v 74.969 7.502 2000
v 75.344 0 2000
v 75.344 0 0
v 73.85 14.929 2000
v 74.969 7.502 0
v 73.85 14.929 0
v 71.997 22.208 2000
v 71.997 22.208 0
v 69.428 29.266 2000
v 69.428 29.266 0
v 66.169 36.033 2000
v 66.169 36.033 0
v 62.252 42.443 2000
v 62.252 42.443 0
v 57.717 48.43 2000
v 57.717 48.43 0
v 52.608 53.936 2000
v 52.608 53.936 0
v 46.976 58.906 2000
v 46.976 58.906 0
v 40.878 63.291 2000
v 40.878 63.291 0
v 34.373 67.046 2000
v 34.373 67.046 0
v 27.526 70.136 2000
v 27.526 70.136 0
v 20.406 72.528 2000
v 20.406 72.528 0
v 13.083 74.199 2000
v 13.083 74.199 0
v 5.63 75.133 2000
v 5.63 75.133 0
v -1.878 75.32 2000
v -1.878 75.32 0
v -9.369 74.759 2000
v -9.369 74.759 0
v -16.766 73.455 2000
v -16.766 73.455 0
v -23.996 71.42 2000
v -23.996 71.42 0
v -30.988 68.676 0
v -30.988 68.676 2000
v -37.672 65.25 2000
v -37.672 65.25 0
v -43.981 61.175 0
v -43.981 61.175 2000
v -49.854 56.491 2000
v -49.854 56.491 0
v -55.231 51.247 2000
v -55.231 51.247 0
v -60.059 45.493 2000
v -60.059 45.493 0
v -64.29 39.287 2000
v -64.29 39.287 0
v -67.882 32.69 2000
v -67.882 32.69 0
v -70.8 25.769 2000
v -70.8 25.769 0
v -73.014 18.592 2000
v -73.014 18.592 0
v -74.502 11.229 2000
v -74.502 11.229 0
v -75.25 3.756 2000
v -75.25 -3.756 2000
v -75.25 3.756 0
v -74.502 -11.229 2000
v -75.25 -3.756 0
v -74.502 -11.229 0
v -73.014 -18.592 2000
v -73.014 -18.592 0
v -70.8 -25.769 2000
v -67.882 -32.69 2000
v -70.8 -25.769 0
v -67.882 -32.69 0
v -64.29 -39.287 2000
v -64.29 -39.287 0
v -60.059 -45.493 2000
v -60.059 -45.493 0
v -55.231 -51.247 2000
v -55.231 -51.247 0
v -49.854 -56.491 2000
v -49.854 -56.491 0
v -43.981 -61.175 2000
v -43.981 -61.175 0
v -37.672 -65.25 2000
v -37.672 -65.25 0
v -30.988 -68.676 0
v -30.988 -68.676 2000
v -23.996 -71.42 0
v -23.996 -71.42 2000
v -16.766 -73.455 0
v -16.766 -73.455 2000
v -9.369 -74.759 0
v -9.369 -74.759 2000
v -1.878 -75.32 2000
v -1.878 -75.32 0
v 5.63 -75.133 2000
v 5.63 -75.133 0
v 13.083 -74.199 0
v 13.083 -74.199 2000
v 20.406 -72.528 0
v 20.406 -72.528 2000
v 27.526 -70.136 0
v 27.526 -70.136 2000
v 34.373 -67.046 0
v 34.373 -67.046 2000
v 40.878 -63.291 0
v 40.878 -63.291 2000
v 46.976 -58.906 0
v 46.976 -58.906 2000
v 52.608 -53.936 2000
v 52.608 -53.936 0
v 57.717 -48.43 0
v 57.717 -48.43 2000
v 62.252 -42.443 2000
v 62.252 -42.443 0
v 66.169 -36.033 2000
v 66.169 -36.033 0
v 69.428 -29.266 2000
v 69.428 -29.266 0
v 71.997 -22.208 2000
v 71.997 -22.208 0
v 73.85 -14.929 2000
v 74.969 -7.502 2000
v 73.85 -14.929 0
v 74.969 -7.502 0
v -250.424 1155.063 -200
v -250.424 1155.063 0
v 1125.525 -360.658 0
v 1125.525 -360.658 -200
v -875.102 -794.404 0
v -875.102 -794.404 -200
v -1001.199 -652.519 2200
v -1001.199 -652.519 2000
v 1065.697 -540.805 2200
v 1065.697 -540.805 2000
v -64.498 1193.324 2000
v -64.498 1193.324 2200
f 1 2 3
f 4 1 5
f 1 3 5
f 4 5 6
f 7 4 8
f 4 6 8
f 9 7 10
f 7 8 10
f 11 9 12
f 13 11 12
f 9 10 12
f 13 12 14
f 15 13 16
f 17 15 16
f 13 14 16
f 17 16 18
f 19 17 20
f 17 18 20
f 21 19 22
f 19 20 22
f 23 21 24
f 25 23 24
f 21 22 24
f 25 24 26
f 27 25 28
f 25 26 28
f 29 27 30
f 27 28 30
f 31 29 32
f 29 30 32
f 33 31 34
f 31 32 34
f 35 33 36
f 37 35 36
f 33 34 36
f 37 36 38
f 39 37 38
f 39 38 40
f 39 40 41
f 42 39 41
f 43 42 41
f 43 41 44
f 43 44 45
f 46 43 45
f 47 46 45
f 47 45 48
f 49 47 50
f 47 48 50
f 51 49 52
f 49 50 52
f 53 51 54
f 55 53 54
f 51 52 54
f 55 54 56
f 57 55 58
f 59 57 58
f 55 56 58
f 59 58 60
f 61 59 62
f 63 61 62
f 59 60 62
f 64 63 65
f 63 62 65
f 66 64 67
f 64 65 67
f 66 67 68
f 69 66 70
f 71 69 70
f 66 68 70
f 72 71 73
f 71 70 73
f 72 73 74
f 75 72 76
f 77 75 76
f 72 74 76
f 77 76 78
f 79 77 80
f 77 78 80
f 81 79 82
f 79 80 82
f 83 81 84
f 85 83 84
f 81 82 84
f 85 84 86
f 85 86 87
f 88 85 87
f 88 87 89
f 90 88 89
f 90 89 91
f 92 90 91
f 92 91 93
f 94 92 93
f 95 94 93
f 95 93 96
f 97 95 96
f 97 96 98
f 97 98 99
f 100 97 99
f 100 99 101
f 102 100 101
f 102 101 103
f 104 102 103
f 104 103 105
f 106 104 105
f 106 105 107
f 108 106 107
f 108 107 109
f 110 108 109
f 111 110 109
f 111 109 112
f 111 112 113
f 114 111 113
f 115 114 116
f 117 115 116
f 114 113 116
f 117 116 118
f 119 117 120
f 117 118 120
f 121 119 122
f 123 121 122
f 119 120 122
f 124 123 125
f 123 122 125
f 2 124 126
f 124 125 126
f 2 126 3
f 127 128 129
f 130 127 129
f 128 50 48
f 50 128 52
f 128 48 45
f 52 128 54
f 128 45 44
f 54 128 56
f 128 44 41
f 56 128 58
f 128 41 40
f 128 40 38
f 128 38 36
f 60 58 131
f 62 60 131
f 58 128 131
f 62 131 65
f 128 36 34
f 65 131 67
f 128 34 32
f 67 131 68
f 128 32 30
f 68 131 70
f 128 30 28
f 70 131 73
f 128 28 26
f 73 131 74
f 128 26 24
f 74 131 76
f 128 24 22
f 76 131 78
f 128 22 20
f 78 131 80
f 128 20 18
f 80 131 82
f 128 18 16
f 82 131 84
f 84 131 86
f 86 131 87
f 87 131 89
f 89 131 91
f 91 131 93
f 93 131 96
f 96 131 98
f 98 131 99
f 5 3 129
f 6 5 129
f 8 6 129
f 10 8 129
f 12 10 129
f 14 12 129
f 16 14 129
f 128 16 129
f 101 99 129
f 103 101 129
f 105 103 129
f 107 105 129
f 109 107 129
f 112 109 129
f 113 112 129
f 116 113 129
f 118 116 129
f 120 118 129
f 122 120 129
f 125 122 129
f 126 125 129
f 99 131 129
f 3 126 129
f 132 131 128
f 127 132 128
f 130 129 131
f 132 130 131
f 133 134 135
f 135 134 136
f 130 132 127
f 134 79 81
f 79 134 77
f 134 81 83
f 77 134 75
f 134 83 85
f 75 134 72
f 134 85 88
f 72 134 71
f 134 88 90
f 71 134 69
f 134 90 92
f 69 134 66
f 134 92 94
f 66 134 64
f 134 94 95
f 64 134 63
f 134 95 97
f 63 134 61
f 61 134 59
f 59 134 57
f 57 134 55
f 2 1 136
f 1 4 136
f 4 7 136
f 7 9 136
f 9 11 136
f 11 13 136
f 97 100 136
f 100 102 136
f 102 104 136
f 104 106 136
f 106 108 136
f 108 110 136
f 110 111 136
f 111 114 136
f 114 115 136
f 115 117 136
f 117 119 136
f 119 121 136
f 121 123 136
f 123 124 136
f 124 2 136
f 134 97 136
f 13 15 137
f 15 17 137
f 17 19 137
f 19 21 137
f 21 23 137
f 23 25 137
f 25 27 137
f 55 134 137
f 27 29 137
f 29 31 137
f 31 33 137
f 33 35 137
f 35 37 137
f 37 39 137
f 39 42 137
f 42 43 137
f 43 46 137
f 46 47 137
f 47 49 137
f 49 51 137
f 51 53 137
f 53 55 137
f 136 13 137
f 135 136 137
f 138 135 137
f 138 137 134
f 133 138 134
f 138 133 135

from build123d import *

# Parameters (mm, degrees)
F0_R     = 75.343822
F1_DEPTH = 2000
F3_DEPTH = 200
F5_DEPTH = 200


with BuildPart() as f1:
    # F0 (on Top) → F1 (new body)
    with BuildSketch(Plane.XY):
        Circle(F0_R)
    extrude(amount=F1_DEPTH)

    # F2 (on face) → F3 (join)
    with BuildSketch(Plane.XY.offset(2000)):
        Polygon((1065.697452, -540.804872), (-64.497968, 1193.323502), (-1001.199484, -652.51863), align=None)
    extrude(amount=F3_DEPTH)

    # F4 (on face) → F5 (join)
    with BuildSketch(Plane(origin=(0, 0, 0), x_dir=(1, 0, 0), z_dir=(0, 0, -1))):
        Polygon((1125.525307, 360.658096), (-875.101726, 794.40446), (-250.42358, -1155.062556), align=None)
    extrude(amount=F5_DEPTH)


solid = f1.part
